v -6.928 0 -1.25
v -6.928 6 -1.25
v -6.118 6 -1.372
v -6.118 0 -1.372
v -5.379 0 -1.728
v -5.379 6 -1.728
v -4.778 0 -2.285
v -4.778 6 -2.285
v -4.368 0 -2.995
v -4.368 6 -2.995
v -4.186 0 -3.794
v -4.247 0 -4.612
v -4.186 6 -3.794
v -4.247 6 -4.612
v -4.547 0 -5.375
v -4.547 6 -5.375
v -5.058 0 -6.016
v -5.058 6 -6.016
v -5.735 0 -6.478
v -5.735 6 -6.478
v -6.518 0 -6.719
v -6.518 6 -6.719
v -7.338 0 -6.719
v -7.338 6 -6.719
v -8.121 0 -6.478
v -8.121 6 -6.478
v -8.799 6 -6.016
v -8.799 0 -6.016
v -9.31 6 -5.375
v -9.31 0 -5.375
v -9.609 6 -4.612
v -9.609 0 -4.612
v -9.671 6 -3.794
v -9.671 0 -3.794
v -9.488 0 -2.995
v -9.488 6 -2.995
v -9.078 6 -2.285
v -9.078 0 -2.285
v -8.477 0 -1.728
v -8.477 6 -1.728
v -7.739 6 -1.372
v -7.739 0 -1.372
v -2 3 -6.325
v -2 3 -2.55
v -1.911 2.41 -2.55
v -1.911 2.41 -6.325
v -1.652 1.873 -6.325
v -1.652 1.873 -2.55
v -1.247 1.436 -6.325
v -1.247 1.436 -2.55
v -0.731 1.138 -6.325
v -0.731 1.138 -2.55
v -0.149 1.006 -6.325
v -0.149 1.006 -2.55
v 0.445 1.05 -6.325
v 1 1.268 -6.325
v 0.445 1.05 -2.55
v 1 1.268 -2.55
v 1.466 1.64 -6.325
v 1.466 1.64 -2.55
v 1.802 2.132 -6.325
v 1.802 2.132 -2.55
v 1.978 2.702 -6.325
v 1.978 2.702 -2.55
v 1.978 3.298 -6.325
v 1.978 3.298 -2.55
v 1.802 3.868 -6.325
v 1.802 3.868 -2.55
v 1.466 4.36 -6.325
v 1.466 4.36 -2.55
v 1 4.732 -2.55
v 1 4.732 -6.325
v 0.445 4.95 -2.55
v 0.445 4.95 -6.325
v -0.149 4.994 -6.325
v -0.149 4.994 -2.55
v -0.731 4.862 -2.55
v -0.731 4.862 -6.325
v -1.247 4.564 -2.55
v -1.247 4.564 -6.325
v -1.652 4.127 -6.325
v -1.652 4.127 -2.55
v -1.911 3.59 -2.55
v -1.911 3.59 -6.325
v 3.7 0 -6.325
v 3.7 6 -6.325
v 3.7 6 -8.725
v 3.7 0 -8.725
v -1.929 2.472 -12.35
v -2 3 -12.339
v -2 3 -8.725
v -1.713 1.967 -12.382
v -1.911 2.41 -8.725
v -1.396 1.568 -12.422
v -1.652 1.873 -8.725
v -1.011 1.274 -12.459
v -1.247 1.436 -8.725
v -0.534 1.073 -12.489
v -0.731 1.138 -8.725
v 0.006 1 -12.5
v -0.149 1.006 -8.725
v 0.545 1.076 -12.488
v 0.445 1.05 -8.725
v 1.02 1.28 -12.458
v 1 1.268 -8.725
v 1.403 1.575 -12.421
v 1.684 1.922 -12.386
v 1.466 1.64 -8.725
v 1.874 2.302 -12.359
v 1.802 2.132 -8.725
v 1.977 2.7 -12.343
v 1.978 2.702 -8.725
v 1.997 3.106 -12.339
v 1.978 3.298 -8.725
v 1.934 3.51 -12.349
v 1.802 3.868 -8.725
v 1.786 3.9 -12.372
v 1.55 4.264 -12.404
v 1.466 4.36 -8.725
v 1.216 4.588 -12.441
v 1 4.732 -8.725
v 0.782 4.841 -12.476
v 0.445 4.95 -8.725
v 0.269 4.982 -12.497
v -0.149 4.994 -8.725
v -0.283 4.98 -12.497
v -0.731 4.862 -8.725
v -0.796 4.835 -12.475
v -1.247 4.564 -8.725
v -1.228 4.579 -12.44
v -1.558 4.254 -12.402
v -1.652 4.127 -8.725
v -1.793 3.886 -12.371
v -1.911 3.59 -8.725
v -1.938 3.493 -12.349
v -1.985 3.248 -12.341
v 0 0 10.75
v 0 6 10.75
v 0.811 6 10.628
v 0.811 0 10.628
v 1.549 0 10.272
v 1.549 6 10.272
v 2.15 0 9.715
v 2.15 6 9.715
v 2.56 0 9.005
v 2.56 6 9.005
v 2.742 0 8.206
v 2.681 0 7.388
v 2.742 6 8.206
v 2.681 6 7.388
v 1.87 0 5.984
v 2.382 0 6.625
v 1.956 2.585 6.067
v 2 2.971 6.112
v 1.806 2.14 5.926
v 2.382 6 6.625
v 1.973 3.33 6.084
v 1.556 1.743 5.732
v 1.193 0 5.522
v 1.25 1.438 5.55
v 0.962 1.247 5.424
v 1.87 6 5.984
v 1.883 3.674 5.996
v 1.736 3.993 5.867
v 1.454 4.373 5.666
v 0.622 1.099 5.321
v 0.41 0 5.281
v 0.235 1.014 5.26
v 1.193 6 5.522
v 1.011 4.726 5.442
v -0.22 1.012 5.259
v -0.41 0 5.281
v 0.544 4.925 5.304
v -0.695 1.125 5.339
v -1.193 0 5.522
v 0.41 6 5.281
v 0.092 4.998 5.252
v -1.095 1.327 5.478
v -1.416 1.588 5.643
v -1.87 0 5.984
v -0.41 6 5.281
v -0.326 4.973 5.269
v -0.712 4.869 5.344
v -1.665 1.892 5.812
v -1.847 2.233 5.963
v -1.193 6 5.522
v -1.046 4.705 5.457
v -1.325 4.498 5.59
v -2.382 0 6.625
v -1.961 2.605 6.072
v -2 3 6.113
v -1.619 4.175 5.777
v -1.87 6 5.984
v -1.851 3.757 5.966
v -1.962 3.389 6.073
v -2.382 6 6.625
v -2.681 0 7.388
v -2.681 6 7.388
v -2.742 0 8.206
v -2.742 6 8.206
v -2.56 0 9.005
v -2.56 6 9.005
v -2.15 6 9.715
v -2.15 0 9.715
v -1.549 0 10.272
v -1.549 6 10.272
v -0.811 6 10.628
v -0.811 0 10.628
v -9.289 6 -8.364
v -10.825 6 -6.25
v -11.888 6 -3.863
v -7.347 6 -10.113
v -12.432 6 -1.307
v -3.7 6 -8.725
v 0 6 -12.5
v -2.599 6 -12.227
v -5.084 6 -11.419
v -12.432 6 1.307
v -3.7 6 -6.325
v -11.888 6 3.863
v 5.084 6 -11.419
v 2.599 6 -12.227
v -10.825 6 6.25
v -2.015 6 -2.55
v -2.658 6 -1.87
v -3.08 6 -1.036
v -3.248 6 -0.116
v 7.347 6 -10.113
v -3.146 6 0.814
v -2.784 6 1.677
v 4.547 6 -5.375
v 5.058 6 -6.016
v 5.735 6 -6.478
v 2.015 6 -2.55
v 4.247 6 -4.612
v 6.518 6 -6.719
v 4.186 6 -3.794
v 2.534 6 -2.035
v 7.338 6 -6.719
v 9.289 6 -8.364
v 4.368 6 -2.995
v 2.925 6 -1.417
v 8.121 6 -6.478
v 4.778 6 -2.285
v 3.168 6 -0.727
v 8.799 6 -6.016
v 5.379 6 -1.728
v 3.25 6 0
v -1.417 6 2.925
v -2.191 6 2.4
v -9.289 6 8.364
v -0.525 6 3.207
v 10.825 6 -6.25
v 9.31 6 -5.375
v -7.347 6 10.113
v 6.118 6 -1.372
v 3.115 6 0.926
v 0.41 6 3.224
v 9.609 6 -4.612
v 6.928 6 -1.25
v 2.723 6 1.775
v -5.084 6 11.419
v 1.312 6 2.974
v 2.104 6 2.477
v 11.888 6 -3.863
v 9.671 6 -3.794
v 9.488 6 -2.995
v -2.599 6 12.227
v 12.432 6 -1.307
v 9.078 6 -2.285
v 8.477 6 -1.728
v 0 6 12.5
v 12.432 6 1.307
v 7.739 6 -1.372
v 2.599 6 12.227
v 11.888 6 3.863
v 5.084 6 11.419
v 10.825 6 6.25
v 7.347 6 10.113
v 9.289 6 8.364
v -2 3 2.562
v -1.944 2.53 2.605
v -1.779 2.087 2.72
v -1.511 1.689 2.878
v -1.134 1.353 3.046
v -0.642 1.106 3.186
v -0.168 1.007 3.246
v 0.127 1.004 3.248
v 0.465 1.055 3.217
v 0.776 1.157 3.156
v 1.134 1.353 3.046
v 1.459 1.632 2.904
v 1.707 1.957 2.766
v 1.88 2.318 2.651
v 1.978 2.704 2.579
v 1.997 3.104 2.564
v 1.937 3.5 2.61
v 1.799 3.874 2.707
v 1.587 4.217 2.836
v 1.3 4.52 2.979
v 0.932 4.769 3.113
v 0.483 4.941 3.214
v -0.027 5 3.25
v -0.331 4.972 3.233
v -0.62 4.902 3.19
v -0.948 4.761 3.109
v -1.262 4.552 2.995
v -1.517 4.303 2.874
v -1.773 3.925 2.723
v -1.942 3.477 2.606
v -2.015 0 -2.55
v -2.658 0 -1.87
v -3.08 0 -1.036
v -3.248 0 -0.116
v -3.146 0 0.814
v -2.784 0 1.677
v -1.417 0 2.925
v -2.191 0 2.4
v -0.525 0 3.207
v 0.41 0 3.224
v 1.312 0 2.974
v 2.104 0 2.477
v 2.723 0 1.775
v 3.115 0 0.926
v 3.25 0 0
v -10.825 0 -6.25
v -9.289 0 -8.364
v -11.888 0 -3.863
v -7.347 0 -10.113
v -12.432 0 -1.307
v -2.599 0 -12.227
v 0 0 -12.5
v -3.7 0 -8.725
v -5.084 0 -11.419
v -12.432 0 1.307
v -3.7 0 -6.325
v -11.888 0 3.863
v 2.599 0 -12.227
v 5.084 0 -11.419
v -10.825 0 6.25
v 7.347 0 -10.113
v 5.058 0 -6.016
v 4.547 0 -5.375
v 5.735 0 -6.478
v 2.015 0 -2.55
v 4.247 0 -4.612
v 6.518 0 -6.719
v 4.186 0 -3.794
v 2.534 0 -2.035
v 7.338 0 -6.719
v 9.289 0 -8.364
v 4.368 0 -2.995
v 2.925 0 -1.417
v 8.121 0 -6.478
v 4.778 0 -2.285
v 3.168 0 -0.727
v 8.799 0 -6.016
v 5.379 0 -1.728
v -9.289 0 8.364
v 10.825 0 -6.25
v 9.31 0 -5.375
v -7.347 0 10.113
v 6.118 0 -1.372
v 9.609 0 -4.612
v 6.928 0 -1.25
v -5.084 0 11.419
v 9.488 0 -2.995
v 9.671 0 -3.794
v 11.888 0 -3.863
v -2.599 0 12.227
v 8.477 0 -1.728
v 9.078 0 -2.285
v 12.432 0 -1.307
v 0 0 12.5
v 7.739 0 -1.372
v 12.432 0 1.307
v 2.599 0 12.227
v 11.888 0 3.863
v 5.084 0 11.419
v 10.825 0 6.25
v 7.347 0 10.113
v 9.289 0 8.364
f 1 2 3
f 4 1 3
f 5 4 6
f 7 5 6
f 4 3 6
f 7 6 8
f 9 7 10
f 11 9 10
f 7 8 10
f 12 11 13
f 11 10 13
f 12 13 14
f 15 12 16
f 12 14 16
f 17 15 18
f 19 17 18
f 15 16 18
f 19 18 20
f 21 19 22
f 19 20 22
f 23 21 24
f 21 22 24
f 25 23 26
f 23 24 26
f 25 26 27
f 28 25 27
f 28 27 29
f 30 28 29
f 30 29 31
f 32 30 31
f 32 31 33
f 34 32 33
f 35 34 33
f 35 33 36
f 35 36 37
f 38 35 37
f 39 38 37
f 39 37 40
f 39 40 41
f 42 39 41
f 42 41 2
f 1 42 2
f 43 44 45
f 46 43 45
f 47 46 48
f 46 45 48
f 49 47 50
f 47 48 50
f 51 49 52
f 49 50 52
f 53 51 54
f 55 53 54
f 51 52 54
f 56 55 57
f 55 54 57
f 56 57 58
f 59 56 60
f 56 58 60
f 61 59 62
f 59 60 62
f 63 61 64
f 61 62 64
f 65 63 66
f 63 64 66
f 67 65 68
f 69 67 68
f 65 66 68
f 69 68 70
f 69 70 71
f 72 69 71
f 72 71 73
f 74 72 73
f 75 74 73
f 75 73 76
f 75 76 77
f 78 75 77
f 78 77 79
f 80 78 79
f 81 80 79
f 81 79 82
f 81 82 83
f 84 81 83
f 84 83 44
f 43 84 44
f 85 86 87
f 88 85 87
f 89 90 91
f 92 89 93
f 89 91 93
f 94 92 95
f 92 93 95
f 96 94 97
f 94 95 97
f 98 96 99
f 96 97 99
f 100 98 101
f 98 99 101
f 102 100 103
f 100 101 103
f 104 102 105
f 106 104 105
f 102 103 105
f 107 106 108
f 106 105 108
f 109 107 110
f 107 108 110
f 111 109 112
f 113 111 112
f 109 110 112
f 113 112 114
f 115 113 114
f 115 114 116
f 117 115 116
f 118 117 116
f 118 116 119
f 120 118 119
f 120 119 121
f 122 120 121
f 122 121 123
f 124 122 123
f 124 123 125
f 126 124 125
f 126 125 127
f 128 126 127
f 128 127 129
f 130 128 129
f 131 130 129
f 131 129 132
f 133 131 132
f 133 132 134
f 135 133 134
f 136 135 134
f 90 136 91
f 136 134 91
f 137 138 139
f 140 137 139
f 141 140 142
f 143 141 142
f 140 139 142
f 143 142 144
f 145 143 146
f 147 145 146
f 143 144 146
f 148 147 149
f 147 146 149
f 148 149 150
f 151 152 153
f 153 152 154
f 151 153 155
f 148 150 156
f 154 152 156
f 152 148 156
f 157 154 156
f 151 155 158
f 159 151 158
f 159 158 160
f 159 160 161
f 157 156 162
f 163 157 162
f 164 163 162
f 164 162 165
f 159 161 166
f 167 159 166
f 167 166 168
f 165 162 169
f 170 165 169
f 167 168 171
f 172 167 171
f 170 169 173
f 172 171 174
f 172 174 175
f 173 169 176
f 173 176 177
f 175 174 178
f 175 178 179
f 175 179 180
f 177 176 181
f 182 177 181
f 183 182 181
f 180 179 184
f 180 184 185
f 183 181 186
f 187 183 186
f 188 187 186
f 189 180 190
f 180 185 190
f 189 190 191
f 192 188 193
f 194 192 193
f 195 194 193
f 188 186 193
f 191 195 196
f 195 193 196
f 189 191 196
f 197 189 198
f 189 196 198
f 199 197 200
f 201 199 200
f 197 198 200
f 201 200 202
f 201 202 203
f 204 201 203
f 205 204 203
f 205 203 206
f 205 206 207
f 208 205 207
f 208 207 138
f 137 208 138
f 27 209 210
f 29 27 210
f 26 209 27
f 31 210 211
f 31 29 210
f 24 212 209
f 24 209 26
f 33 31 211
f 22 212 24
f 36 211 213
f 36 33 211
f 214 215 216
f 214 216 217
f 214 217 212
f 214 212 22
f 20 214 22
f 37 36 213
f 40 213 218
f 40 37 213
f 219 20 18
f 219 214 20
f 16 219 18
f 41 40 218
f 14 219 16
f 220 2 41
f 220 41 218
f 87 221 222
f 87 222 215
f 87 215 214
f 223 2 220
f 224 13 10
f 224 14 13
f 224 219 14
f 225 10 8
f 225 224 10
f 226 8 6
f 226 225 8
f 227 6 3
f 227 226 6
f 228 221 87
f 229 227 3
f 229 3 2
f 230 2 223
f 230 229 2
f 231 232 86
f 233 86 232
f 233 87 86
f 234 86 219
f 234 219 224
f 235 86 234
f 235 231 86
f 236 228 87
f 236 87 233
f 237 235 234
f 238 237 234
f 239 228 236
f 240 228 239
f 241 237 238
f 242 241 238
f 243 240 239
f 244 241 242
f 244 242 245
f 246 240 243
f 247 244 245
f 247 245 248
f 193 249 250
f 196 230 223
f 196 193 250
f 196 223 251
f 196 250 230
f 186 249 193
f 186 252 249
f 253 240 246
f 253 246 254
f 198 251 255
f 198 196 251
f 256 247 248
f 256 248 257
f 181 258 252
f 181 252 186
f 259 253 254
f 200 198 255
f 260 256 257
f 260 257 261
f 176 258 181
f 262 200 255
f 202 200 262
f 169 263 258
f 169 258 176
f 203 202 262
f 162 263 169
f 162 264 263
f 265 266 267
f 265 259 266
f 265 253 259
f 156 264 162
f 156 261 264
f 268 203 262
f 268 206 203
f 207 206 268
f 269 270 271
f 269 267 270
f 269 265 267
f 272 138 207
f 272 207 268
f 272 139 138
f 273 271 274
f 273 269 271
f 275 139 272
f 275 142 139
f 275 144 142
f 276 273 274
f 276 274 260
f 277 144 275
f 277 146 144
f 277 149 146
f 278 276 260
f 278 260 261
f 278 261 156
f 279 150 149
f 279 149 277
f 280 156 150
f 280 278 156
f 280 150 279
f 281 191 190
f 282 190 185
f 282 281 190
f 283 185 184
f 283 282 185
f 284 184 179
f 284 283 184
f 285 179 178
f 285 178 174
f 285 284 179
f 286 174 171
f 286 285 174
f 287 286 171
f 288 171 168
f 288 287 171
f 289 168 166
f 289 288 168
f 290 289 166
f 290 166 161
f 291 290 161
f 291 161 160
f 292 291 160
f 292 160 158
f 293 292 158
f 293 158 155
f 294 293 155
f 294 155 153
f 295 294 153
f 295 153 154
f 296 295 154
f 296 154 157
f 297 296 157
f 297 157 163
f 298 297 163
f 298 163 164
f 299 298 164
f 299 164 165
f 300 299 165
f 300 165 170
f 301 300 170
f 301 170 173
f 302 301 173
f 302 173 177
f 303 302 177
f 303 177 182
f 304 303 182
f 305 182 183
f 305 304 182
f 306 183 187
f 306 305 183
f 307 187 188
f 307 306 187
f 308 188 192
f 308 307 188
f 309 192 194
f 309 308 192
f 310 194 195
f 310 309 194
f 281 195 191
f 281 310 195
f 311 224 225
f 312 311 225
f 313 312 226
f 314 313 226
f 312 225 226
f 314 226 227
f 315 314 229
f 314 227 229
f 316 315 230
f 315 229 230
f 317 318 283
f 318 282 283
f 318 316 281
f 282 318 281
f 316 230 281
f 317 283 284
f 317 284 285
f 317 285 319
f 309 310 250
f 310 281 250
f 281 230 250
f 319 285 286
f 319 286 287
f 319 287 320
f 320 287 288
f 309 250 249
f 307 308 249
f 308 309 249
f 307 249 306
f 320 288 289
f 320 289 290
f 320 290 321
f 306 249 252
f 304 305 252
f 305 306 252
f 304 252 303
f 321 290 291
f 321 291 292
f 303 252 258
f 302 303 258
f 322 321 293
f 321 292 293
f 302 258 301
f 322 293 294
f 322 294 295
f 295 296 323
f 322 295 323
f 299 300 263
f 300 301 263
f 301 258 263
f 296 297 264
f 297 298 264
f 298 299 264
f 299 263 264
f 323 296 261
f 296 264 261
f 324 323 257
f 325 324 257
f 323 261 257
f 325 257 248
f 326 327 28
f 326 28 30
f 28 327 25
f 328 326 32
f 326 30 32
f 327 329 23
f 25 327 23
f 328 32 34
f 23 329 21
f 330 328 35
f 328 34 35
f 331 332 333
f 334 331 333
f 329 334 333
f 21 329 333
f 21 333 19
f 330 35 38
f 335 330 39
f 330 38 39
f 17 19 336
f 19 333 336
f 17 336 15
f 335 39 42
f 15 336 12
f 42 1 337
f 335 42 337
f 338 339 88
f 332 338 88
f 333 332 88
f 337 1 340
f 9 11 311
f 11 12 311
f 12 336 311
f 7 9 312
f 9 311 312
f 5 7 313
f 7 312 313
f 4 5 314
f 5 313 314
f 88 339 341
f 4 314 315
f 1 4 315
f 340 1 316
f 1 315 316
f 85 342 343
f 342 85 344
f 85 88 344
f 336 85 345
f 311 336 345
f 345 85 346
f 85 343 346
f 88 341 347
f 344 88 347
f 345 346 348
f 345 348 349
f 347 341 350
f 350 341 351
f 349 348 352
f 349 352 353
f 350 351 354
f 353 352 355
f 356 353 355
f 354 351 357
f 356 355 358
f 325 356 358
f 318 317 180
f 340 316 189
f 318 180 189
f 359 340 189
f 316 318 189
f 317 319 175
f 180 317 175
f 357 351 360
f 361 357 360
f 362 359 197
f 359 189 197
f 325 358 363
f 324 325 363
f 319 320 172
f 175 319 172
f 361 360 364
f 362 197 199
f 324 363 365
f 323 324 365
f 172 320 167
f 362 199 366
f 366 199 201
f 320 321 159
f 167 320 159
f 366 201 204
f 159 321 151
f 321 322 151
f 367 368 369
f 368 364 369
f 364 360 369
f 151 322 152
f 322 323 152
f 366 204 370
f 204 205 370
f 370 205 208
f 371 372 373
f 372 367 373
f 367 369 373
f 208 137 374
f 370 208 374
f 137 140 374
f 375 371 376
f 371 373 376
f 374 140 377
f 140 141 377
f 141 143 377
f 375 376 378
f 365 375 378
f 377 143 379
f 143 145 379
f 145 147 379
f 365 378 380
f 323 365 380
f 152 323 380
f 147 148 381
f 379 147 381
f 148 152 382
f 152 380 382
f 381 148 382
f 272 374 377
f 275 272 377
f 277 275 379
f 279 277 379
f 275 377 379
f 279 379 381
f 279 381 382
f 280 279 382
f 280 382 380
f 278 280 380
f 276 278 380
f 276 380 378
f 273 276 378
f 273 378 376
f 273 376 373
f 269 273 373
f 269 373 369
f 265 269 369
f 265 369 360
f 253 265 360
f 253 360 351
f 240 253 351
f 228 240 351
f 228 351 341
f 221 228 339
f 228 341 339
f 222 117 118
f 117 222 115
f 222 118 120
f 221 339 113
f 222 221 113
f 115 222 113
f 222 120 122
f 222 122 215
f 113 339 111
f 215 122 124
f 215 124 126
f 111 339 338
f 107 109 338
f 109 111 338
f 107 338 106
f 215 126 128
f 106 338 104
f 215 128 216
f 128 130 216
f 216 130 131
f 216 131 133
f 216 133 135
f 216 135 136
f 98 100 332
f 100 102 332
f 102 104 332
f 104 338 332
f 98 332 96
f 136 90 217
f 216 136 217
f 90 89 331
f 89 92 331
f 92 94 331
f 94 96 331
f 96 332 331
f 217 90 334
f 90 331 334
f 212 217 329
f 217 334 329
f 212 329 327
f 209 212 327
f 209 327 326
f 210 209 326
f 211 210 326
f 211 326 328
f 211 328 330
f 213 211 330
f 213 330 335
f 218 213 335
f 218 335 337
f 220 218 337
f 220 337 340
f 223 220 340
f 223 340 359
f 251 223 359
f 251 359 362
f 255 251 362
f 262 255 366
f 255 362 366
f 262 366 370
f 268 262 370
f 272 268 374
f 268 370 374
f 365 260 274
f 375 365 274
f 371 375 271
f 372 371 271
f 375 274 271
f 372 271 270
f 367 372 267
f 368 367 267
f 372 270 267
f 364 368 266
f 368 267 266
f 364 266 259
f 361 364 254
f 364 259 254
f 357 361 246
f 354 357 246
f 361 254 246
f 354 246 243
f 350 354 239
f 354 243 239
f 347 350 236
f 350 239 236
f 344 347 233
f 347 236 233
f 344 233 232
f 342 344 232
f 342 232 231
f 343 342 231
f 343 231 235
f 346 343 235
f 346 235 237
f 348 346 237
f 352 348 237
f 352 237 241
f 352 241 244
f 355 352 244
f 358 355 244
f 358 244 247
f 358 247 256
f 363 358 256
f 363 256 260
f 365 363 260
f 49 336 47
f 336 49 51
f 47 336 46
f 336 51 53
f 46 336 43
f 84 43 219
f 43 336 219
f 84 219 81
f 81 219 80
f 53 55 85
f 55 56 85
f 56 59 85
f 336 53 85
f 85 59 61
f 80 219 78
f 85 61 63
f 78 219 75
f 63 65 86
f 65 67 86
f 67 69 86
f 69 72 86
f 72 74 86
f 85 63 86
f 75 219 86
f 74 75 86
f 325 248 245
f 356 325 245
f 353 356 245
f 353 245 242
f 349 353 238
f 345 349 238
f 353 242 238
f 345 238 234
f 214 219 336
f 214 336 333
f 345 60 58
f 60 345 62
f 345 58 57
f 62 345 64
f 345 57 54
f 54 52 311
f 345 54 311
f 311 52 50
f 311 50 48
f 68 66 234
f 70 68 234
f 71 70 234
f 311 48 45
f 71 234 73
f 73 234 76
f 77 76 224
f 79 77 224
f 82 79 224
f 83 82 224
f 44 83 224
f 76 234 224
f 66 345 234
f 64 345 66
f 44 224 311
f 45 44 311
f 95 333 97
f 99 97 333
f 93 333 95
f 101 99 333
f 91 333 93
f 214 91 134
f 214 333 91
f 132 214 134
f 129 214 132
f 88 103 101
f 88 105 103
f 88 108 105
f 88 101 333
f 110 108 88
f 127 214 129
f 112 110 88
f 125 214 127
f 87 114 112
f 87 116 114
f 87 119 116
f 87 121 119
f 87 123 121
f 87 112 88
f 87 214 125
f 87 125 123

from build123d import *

# Parameters (mm, degrees)
SKETCH1_R                      = 12.5
BOSS_EXTRUDE1_DEPTH            = 6
CUT_EXTRUDE1_REACH             = 20.668
CUT_EXTRUDE2_REACH             = 20.668
SKETCH3_R                      = 2.75
CUT_EXTRUDE3_REACH             = 22.463
SKETCH4_R                      = 2
CUT_EXTRUDE3_DIRECTION_2_REACH = 22.463
CUT_EXTRUDE4_REACH             = 20.668
SKETCH5_W                      = 7.4
SKETCH5_H                      = 2.4


with BuildPart() as part:
    # Sketch1 → Boss-Extrude1 (new body)
    with BuildSketch(Plane(origin=(0, 0, 0), x_dir=(1, 0, 0), z_dir=(0, 1, 0))):
        with Locations(Location((0, 0, 0), (0, 0, 270))):
            Circle(SKETCH1_R)
    extrude(amount=BOSS_EXTRUDE1_DEPTH)

    # Sketch2 → Cut-Extrude1 (cut, up to next)
    with BuildSketch(Plane(origin=(0, 6, 0), x_dir=(1, 0, 0), z_dir=(0, 1, 0)), mode=Mode.PRIVATE) as cut_extrude1_sk1:
        with BuildLine():
            Line((2.014944168, 2.55), (-2.014944168, 2.55))
            ThreePointArc((-2.014944168, 2.55), (-1.416674178, -2.924984491), (3.25, 0))
            ThreePointArc((3.25, 0), (2.924984491, 1.416674178), (2.014944168, 2.55))
        make_face()
    cut_extrude1_tool1 = extrude(cut_extrude1_sk1.sketch, amount=-CUT_EXTRUDE1_REACH, mode=Mode.PRIVATE) & part.part
    add(cut_extrude1_tool1.solids().sort_by_distance((0, 6, 0.174477))[0], mode=Mode.SUBTRACT)

    # Sketch3 → Cut-Extrude2 (cut, up to next)
    with BuildSketch(Plane(origin=(0, 6, 0), x_dir=(1, 0, 0), z_dir=(0, 1, 0)), mode=Mode.PRIVATE) as cut_extrude2_sk1:
        with Locations(Location((0, -8, 0), (0, 0, 270))):
            Circle(SKETCH3_R)
    cut_extrude2_tool1 = extrude(cut_extrude2_sk1.sketch, amount=-CUT_EXTRUDE2_REACH, mode=Mode.PRIVATE) & part.part
    # Sketch3 → Cut-Extrude2 (cut, up to next)
    with BuildSketch(Plane(origin=(0, 6, 0), x_dir=(1, 0, 0), z_dir=(0, 1, 0)), mode=Mode.PRIVATE) as cut_extrude2_sk2:
        with Locations(Location((-6.92820323, 4, 0), (0, 0, 270))):
            Circle(SKETCH3_R)
    cut_extrude2_tool2 = extrude(cut_extrude2_sk2.sketch, amount=-CUT_EXTRUDE2_REACH, mode=Mode.PRIVATE) & part.part
    # Sketch3 → Cut-Extrude2 (cut, up to next)
    with BuildSketch(Plane(origin=(0, 6, 0), x_dir=(1, 0, 0), z_dir=(0, 1, 0)), mode=Mode.PRIVATE) as cut_extrude2_sk3:
        with Locations(Location((6.92820323, 4, 0), (0, 0, 270))):
            Circle(SKETCH3_R)
    cut_extrude2_tool3 = extrude(cut_extrude2_sk3.sketch, amount=-CUT_EXTRUDE2_REACH, mode=Mode.PRIVATE) & part.part
    add(cut_extrude2_tool1.solids().sort_by_distance((0, 6, 8))[0], mode=Mode.SUBTRACT)
    add(cut_extrude2_tool2.solids().sort_by_distance((-6.928203, 6, -4))[0], mode=Mode.SUBTRACT)
    add(cut_extrude2_tool3.solids().sort_by_distance((6.928203, 6, -4))[0], mode=Mode.SUBTRACT)

    # Sketch4 → Cut-Extrude3 (cut, up to next)
    with BuildSketch(Plane.XY.offset(-2.55), mode=Mode.PRIVATE) as cut_extrude3_sk1:
        with Locations(Location((0, 3, 0), (0, 0, 180))):
            Circle(SKETCH4_R)
    cut_extrude3_tool1 = extrude(cut_extrude3_sk1.sketch, amount=-CUT_EXTRUDE3_REACH, mode=Mode.PRIVATE) & part.part
    add(cut_extrude3_tool1.solids().sort_by_distance((0, 3, -2.55))[0], mode=Mode.SUBTRACT)

    # Sketch4 → Cut-Extrude3 direction 2 (cut, up to next)
    with BuildSketch(Plane.XY.offset(-2.55), mode=Mode.PRIVATE) as cut_extrude3_direction_2_sk1:
        with Locations(Location((0, 3, 0), (0, 0, 180))):
            Circle(SKETCH4_R)
    cut_extrude3_direction_2_tool1 = extrude(cut_extrude3_direction_2_sk1.sketch, amount=CUT_EXTRUDE3_DIRECTION_2_REACH, mode=Mode.PRIVATE) & part.part
    add(cut_extrude3_direction_2_tool1.solids().sort_by_distance((0, 3, -2.55))[0], mode=Mode.SUBTRACT)

    # Sketch5 → Cut-Extrude4 (cut, up to next)
    with BuildSketch(Plane(origin=(0, 6, 0), x_dir=(1, 0, 0), z_dir=(0, 1, 0)), mode=Mode.PRIVATE) as cut_extrude4_sk1:
        with Locations((0, 7.525)):
            Rectangle(SKETCH5_W, SKETCH5_H)
    cut_extrude4_tool1 = extrude(cut_extrude4_sk1.sketch, amount=-CUT_EXTRUDE4_REACH, mode=Mode.PRIVATE) & part.part
    add(cut_extrude4_tool1.solids().sort_by_distance((0, 6, -7.525))[0], mode=Mode.SUBTRACT)


solid = part.part
